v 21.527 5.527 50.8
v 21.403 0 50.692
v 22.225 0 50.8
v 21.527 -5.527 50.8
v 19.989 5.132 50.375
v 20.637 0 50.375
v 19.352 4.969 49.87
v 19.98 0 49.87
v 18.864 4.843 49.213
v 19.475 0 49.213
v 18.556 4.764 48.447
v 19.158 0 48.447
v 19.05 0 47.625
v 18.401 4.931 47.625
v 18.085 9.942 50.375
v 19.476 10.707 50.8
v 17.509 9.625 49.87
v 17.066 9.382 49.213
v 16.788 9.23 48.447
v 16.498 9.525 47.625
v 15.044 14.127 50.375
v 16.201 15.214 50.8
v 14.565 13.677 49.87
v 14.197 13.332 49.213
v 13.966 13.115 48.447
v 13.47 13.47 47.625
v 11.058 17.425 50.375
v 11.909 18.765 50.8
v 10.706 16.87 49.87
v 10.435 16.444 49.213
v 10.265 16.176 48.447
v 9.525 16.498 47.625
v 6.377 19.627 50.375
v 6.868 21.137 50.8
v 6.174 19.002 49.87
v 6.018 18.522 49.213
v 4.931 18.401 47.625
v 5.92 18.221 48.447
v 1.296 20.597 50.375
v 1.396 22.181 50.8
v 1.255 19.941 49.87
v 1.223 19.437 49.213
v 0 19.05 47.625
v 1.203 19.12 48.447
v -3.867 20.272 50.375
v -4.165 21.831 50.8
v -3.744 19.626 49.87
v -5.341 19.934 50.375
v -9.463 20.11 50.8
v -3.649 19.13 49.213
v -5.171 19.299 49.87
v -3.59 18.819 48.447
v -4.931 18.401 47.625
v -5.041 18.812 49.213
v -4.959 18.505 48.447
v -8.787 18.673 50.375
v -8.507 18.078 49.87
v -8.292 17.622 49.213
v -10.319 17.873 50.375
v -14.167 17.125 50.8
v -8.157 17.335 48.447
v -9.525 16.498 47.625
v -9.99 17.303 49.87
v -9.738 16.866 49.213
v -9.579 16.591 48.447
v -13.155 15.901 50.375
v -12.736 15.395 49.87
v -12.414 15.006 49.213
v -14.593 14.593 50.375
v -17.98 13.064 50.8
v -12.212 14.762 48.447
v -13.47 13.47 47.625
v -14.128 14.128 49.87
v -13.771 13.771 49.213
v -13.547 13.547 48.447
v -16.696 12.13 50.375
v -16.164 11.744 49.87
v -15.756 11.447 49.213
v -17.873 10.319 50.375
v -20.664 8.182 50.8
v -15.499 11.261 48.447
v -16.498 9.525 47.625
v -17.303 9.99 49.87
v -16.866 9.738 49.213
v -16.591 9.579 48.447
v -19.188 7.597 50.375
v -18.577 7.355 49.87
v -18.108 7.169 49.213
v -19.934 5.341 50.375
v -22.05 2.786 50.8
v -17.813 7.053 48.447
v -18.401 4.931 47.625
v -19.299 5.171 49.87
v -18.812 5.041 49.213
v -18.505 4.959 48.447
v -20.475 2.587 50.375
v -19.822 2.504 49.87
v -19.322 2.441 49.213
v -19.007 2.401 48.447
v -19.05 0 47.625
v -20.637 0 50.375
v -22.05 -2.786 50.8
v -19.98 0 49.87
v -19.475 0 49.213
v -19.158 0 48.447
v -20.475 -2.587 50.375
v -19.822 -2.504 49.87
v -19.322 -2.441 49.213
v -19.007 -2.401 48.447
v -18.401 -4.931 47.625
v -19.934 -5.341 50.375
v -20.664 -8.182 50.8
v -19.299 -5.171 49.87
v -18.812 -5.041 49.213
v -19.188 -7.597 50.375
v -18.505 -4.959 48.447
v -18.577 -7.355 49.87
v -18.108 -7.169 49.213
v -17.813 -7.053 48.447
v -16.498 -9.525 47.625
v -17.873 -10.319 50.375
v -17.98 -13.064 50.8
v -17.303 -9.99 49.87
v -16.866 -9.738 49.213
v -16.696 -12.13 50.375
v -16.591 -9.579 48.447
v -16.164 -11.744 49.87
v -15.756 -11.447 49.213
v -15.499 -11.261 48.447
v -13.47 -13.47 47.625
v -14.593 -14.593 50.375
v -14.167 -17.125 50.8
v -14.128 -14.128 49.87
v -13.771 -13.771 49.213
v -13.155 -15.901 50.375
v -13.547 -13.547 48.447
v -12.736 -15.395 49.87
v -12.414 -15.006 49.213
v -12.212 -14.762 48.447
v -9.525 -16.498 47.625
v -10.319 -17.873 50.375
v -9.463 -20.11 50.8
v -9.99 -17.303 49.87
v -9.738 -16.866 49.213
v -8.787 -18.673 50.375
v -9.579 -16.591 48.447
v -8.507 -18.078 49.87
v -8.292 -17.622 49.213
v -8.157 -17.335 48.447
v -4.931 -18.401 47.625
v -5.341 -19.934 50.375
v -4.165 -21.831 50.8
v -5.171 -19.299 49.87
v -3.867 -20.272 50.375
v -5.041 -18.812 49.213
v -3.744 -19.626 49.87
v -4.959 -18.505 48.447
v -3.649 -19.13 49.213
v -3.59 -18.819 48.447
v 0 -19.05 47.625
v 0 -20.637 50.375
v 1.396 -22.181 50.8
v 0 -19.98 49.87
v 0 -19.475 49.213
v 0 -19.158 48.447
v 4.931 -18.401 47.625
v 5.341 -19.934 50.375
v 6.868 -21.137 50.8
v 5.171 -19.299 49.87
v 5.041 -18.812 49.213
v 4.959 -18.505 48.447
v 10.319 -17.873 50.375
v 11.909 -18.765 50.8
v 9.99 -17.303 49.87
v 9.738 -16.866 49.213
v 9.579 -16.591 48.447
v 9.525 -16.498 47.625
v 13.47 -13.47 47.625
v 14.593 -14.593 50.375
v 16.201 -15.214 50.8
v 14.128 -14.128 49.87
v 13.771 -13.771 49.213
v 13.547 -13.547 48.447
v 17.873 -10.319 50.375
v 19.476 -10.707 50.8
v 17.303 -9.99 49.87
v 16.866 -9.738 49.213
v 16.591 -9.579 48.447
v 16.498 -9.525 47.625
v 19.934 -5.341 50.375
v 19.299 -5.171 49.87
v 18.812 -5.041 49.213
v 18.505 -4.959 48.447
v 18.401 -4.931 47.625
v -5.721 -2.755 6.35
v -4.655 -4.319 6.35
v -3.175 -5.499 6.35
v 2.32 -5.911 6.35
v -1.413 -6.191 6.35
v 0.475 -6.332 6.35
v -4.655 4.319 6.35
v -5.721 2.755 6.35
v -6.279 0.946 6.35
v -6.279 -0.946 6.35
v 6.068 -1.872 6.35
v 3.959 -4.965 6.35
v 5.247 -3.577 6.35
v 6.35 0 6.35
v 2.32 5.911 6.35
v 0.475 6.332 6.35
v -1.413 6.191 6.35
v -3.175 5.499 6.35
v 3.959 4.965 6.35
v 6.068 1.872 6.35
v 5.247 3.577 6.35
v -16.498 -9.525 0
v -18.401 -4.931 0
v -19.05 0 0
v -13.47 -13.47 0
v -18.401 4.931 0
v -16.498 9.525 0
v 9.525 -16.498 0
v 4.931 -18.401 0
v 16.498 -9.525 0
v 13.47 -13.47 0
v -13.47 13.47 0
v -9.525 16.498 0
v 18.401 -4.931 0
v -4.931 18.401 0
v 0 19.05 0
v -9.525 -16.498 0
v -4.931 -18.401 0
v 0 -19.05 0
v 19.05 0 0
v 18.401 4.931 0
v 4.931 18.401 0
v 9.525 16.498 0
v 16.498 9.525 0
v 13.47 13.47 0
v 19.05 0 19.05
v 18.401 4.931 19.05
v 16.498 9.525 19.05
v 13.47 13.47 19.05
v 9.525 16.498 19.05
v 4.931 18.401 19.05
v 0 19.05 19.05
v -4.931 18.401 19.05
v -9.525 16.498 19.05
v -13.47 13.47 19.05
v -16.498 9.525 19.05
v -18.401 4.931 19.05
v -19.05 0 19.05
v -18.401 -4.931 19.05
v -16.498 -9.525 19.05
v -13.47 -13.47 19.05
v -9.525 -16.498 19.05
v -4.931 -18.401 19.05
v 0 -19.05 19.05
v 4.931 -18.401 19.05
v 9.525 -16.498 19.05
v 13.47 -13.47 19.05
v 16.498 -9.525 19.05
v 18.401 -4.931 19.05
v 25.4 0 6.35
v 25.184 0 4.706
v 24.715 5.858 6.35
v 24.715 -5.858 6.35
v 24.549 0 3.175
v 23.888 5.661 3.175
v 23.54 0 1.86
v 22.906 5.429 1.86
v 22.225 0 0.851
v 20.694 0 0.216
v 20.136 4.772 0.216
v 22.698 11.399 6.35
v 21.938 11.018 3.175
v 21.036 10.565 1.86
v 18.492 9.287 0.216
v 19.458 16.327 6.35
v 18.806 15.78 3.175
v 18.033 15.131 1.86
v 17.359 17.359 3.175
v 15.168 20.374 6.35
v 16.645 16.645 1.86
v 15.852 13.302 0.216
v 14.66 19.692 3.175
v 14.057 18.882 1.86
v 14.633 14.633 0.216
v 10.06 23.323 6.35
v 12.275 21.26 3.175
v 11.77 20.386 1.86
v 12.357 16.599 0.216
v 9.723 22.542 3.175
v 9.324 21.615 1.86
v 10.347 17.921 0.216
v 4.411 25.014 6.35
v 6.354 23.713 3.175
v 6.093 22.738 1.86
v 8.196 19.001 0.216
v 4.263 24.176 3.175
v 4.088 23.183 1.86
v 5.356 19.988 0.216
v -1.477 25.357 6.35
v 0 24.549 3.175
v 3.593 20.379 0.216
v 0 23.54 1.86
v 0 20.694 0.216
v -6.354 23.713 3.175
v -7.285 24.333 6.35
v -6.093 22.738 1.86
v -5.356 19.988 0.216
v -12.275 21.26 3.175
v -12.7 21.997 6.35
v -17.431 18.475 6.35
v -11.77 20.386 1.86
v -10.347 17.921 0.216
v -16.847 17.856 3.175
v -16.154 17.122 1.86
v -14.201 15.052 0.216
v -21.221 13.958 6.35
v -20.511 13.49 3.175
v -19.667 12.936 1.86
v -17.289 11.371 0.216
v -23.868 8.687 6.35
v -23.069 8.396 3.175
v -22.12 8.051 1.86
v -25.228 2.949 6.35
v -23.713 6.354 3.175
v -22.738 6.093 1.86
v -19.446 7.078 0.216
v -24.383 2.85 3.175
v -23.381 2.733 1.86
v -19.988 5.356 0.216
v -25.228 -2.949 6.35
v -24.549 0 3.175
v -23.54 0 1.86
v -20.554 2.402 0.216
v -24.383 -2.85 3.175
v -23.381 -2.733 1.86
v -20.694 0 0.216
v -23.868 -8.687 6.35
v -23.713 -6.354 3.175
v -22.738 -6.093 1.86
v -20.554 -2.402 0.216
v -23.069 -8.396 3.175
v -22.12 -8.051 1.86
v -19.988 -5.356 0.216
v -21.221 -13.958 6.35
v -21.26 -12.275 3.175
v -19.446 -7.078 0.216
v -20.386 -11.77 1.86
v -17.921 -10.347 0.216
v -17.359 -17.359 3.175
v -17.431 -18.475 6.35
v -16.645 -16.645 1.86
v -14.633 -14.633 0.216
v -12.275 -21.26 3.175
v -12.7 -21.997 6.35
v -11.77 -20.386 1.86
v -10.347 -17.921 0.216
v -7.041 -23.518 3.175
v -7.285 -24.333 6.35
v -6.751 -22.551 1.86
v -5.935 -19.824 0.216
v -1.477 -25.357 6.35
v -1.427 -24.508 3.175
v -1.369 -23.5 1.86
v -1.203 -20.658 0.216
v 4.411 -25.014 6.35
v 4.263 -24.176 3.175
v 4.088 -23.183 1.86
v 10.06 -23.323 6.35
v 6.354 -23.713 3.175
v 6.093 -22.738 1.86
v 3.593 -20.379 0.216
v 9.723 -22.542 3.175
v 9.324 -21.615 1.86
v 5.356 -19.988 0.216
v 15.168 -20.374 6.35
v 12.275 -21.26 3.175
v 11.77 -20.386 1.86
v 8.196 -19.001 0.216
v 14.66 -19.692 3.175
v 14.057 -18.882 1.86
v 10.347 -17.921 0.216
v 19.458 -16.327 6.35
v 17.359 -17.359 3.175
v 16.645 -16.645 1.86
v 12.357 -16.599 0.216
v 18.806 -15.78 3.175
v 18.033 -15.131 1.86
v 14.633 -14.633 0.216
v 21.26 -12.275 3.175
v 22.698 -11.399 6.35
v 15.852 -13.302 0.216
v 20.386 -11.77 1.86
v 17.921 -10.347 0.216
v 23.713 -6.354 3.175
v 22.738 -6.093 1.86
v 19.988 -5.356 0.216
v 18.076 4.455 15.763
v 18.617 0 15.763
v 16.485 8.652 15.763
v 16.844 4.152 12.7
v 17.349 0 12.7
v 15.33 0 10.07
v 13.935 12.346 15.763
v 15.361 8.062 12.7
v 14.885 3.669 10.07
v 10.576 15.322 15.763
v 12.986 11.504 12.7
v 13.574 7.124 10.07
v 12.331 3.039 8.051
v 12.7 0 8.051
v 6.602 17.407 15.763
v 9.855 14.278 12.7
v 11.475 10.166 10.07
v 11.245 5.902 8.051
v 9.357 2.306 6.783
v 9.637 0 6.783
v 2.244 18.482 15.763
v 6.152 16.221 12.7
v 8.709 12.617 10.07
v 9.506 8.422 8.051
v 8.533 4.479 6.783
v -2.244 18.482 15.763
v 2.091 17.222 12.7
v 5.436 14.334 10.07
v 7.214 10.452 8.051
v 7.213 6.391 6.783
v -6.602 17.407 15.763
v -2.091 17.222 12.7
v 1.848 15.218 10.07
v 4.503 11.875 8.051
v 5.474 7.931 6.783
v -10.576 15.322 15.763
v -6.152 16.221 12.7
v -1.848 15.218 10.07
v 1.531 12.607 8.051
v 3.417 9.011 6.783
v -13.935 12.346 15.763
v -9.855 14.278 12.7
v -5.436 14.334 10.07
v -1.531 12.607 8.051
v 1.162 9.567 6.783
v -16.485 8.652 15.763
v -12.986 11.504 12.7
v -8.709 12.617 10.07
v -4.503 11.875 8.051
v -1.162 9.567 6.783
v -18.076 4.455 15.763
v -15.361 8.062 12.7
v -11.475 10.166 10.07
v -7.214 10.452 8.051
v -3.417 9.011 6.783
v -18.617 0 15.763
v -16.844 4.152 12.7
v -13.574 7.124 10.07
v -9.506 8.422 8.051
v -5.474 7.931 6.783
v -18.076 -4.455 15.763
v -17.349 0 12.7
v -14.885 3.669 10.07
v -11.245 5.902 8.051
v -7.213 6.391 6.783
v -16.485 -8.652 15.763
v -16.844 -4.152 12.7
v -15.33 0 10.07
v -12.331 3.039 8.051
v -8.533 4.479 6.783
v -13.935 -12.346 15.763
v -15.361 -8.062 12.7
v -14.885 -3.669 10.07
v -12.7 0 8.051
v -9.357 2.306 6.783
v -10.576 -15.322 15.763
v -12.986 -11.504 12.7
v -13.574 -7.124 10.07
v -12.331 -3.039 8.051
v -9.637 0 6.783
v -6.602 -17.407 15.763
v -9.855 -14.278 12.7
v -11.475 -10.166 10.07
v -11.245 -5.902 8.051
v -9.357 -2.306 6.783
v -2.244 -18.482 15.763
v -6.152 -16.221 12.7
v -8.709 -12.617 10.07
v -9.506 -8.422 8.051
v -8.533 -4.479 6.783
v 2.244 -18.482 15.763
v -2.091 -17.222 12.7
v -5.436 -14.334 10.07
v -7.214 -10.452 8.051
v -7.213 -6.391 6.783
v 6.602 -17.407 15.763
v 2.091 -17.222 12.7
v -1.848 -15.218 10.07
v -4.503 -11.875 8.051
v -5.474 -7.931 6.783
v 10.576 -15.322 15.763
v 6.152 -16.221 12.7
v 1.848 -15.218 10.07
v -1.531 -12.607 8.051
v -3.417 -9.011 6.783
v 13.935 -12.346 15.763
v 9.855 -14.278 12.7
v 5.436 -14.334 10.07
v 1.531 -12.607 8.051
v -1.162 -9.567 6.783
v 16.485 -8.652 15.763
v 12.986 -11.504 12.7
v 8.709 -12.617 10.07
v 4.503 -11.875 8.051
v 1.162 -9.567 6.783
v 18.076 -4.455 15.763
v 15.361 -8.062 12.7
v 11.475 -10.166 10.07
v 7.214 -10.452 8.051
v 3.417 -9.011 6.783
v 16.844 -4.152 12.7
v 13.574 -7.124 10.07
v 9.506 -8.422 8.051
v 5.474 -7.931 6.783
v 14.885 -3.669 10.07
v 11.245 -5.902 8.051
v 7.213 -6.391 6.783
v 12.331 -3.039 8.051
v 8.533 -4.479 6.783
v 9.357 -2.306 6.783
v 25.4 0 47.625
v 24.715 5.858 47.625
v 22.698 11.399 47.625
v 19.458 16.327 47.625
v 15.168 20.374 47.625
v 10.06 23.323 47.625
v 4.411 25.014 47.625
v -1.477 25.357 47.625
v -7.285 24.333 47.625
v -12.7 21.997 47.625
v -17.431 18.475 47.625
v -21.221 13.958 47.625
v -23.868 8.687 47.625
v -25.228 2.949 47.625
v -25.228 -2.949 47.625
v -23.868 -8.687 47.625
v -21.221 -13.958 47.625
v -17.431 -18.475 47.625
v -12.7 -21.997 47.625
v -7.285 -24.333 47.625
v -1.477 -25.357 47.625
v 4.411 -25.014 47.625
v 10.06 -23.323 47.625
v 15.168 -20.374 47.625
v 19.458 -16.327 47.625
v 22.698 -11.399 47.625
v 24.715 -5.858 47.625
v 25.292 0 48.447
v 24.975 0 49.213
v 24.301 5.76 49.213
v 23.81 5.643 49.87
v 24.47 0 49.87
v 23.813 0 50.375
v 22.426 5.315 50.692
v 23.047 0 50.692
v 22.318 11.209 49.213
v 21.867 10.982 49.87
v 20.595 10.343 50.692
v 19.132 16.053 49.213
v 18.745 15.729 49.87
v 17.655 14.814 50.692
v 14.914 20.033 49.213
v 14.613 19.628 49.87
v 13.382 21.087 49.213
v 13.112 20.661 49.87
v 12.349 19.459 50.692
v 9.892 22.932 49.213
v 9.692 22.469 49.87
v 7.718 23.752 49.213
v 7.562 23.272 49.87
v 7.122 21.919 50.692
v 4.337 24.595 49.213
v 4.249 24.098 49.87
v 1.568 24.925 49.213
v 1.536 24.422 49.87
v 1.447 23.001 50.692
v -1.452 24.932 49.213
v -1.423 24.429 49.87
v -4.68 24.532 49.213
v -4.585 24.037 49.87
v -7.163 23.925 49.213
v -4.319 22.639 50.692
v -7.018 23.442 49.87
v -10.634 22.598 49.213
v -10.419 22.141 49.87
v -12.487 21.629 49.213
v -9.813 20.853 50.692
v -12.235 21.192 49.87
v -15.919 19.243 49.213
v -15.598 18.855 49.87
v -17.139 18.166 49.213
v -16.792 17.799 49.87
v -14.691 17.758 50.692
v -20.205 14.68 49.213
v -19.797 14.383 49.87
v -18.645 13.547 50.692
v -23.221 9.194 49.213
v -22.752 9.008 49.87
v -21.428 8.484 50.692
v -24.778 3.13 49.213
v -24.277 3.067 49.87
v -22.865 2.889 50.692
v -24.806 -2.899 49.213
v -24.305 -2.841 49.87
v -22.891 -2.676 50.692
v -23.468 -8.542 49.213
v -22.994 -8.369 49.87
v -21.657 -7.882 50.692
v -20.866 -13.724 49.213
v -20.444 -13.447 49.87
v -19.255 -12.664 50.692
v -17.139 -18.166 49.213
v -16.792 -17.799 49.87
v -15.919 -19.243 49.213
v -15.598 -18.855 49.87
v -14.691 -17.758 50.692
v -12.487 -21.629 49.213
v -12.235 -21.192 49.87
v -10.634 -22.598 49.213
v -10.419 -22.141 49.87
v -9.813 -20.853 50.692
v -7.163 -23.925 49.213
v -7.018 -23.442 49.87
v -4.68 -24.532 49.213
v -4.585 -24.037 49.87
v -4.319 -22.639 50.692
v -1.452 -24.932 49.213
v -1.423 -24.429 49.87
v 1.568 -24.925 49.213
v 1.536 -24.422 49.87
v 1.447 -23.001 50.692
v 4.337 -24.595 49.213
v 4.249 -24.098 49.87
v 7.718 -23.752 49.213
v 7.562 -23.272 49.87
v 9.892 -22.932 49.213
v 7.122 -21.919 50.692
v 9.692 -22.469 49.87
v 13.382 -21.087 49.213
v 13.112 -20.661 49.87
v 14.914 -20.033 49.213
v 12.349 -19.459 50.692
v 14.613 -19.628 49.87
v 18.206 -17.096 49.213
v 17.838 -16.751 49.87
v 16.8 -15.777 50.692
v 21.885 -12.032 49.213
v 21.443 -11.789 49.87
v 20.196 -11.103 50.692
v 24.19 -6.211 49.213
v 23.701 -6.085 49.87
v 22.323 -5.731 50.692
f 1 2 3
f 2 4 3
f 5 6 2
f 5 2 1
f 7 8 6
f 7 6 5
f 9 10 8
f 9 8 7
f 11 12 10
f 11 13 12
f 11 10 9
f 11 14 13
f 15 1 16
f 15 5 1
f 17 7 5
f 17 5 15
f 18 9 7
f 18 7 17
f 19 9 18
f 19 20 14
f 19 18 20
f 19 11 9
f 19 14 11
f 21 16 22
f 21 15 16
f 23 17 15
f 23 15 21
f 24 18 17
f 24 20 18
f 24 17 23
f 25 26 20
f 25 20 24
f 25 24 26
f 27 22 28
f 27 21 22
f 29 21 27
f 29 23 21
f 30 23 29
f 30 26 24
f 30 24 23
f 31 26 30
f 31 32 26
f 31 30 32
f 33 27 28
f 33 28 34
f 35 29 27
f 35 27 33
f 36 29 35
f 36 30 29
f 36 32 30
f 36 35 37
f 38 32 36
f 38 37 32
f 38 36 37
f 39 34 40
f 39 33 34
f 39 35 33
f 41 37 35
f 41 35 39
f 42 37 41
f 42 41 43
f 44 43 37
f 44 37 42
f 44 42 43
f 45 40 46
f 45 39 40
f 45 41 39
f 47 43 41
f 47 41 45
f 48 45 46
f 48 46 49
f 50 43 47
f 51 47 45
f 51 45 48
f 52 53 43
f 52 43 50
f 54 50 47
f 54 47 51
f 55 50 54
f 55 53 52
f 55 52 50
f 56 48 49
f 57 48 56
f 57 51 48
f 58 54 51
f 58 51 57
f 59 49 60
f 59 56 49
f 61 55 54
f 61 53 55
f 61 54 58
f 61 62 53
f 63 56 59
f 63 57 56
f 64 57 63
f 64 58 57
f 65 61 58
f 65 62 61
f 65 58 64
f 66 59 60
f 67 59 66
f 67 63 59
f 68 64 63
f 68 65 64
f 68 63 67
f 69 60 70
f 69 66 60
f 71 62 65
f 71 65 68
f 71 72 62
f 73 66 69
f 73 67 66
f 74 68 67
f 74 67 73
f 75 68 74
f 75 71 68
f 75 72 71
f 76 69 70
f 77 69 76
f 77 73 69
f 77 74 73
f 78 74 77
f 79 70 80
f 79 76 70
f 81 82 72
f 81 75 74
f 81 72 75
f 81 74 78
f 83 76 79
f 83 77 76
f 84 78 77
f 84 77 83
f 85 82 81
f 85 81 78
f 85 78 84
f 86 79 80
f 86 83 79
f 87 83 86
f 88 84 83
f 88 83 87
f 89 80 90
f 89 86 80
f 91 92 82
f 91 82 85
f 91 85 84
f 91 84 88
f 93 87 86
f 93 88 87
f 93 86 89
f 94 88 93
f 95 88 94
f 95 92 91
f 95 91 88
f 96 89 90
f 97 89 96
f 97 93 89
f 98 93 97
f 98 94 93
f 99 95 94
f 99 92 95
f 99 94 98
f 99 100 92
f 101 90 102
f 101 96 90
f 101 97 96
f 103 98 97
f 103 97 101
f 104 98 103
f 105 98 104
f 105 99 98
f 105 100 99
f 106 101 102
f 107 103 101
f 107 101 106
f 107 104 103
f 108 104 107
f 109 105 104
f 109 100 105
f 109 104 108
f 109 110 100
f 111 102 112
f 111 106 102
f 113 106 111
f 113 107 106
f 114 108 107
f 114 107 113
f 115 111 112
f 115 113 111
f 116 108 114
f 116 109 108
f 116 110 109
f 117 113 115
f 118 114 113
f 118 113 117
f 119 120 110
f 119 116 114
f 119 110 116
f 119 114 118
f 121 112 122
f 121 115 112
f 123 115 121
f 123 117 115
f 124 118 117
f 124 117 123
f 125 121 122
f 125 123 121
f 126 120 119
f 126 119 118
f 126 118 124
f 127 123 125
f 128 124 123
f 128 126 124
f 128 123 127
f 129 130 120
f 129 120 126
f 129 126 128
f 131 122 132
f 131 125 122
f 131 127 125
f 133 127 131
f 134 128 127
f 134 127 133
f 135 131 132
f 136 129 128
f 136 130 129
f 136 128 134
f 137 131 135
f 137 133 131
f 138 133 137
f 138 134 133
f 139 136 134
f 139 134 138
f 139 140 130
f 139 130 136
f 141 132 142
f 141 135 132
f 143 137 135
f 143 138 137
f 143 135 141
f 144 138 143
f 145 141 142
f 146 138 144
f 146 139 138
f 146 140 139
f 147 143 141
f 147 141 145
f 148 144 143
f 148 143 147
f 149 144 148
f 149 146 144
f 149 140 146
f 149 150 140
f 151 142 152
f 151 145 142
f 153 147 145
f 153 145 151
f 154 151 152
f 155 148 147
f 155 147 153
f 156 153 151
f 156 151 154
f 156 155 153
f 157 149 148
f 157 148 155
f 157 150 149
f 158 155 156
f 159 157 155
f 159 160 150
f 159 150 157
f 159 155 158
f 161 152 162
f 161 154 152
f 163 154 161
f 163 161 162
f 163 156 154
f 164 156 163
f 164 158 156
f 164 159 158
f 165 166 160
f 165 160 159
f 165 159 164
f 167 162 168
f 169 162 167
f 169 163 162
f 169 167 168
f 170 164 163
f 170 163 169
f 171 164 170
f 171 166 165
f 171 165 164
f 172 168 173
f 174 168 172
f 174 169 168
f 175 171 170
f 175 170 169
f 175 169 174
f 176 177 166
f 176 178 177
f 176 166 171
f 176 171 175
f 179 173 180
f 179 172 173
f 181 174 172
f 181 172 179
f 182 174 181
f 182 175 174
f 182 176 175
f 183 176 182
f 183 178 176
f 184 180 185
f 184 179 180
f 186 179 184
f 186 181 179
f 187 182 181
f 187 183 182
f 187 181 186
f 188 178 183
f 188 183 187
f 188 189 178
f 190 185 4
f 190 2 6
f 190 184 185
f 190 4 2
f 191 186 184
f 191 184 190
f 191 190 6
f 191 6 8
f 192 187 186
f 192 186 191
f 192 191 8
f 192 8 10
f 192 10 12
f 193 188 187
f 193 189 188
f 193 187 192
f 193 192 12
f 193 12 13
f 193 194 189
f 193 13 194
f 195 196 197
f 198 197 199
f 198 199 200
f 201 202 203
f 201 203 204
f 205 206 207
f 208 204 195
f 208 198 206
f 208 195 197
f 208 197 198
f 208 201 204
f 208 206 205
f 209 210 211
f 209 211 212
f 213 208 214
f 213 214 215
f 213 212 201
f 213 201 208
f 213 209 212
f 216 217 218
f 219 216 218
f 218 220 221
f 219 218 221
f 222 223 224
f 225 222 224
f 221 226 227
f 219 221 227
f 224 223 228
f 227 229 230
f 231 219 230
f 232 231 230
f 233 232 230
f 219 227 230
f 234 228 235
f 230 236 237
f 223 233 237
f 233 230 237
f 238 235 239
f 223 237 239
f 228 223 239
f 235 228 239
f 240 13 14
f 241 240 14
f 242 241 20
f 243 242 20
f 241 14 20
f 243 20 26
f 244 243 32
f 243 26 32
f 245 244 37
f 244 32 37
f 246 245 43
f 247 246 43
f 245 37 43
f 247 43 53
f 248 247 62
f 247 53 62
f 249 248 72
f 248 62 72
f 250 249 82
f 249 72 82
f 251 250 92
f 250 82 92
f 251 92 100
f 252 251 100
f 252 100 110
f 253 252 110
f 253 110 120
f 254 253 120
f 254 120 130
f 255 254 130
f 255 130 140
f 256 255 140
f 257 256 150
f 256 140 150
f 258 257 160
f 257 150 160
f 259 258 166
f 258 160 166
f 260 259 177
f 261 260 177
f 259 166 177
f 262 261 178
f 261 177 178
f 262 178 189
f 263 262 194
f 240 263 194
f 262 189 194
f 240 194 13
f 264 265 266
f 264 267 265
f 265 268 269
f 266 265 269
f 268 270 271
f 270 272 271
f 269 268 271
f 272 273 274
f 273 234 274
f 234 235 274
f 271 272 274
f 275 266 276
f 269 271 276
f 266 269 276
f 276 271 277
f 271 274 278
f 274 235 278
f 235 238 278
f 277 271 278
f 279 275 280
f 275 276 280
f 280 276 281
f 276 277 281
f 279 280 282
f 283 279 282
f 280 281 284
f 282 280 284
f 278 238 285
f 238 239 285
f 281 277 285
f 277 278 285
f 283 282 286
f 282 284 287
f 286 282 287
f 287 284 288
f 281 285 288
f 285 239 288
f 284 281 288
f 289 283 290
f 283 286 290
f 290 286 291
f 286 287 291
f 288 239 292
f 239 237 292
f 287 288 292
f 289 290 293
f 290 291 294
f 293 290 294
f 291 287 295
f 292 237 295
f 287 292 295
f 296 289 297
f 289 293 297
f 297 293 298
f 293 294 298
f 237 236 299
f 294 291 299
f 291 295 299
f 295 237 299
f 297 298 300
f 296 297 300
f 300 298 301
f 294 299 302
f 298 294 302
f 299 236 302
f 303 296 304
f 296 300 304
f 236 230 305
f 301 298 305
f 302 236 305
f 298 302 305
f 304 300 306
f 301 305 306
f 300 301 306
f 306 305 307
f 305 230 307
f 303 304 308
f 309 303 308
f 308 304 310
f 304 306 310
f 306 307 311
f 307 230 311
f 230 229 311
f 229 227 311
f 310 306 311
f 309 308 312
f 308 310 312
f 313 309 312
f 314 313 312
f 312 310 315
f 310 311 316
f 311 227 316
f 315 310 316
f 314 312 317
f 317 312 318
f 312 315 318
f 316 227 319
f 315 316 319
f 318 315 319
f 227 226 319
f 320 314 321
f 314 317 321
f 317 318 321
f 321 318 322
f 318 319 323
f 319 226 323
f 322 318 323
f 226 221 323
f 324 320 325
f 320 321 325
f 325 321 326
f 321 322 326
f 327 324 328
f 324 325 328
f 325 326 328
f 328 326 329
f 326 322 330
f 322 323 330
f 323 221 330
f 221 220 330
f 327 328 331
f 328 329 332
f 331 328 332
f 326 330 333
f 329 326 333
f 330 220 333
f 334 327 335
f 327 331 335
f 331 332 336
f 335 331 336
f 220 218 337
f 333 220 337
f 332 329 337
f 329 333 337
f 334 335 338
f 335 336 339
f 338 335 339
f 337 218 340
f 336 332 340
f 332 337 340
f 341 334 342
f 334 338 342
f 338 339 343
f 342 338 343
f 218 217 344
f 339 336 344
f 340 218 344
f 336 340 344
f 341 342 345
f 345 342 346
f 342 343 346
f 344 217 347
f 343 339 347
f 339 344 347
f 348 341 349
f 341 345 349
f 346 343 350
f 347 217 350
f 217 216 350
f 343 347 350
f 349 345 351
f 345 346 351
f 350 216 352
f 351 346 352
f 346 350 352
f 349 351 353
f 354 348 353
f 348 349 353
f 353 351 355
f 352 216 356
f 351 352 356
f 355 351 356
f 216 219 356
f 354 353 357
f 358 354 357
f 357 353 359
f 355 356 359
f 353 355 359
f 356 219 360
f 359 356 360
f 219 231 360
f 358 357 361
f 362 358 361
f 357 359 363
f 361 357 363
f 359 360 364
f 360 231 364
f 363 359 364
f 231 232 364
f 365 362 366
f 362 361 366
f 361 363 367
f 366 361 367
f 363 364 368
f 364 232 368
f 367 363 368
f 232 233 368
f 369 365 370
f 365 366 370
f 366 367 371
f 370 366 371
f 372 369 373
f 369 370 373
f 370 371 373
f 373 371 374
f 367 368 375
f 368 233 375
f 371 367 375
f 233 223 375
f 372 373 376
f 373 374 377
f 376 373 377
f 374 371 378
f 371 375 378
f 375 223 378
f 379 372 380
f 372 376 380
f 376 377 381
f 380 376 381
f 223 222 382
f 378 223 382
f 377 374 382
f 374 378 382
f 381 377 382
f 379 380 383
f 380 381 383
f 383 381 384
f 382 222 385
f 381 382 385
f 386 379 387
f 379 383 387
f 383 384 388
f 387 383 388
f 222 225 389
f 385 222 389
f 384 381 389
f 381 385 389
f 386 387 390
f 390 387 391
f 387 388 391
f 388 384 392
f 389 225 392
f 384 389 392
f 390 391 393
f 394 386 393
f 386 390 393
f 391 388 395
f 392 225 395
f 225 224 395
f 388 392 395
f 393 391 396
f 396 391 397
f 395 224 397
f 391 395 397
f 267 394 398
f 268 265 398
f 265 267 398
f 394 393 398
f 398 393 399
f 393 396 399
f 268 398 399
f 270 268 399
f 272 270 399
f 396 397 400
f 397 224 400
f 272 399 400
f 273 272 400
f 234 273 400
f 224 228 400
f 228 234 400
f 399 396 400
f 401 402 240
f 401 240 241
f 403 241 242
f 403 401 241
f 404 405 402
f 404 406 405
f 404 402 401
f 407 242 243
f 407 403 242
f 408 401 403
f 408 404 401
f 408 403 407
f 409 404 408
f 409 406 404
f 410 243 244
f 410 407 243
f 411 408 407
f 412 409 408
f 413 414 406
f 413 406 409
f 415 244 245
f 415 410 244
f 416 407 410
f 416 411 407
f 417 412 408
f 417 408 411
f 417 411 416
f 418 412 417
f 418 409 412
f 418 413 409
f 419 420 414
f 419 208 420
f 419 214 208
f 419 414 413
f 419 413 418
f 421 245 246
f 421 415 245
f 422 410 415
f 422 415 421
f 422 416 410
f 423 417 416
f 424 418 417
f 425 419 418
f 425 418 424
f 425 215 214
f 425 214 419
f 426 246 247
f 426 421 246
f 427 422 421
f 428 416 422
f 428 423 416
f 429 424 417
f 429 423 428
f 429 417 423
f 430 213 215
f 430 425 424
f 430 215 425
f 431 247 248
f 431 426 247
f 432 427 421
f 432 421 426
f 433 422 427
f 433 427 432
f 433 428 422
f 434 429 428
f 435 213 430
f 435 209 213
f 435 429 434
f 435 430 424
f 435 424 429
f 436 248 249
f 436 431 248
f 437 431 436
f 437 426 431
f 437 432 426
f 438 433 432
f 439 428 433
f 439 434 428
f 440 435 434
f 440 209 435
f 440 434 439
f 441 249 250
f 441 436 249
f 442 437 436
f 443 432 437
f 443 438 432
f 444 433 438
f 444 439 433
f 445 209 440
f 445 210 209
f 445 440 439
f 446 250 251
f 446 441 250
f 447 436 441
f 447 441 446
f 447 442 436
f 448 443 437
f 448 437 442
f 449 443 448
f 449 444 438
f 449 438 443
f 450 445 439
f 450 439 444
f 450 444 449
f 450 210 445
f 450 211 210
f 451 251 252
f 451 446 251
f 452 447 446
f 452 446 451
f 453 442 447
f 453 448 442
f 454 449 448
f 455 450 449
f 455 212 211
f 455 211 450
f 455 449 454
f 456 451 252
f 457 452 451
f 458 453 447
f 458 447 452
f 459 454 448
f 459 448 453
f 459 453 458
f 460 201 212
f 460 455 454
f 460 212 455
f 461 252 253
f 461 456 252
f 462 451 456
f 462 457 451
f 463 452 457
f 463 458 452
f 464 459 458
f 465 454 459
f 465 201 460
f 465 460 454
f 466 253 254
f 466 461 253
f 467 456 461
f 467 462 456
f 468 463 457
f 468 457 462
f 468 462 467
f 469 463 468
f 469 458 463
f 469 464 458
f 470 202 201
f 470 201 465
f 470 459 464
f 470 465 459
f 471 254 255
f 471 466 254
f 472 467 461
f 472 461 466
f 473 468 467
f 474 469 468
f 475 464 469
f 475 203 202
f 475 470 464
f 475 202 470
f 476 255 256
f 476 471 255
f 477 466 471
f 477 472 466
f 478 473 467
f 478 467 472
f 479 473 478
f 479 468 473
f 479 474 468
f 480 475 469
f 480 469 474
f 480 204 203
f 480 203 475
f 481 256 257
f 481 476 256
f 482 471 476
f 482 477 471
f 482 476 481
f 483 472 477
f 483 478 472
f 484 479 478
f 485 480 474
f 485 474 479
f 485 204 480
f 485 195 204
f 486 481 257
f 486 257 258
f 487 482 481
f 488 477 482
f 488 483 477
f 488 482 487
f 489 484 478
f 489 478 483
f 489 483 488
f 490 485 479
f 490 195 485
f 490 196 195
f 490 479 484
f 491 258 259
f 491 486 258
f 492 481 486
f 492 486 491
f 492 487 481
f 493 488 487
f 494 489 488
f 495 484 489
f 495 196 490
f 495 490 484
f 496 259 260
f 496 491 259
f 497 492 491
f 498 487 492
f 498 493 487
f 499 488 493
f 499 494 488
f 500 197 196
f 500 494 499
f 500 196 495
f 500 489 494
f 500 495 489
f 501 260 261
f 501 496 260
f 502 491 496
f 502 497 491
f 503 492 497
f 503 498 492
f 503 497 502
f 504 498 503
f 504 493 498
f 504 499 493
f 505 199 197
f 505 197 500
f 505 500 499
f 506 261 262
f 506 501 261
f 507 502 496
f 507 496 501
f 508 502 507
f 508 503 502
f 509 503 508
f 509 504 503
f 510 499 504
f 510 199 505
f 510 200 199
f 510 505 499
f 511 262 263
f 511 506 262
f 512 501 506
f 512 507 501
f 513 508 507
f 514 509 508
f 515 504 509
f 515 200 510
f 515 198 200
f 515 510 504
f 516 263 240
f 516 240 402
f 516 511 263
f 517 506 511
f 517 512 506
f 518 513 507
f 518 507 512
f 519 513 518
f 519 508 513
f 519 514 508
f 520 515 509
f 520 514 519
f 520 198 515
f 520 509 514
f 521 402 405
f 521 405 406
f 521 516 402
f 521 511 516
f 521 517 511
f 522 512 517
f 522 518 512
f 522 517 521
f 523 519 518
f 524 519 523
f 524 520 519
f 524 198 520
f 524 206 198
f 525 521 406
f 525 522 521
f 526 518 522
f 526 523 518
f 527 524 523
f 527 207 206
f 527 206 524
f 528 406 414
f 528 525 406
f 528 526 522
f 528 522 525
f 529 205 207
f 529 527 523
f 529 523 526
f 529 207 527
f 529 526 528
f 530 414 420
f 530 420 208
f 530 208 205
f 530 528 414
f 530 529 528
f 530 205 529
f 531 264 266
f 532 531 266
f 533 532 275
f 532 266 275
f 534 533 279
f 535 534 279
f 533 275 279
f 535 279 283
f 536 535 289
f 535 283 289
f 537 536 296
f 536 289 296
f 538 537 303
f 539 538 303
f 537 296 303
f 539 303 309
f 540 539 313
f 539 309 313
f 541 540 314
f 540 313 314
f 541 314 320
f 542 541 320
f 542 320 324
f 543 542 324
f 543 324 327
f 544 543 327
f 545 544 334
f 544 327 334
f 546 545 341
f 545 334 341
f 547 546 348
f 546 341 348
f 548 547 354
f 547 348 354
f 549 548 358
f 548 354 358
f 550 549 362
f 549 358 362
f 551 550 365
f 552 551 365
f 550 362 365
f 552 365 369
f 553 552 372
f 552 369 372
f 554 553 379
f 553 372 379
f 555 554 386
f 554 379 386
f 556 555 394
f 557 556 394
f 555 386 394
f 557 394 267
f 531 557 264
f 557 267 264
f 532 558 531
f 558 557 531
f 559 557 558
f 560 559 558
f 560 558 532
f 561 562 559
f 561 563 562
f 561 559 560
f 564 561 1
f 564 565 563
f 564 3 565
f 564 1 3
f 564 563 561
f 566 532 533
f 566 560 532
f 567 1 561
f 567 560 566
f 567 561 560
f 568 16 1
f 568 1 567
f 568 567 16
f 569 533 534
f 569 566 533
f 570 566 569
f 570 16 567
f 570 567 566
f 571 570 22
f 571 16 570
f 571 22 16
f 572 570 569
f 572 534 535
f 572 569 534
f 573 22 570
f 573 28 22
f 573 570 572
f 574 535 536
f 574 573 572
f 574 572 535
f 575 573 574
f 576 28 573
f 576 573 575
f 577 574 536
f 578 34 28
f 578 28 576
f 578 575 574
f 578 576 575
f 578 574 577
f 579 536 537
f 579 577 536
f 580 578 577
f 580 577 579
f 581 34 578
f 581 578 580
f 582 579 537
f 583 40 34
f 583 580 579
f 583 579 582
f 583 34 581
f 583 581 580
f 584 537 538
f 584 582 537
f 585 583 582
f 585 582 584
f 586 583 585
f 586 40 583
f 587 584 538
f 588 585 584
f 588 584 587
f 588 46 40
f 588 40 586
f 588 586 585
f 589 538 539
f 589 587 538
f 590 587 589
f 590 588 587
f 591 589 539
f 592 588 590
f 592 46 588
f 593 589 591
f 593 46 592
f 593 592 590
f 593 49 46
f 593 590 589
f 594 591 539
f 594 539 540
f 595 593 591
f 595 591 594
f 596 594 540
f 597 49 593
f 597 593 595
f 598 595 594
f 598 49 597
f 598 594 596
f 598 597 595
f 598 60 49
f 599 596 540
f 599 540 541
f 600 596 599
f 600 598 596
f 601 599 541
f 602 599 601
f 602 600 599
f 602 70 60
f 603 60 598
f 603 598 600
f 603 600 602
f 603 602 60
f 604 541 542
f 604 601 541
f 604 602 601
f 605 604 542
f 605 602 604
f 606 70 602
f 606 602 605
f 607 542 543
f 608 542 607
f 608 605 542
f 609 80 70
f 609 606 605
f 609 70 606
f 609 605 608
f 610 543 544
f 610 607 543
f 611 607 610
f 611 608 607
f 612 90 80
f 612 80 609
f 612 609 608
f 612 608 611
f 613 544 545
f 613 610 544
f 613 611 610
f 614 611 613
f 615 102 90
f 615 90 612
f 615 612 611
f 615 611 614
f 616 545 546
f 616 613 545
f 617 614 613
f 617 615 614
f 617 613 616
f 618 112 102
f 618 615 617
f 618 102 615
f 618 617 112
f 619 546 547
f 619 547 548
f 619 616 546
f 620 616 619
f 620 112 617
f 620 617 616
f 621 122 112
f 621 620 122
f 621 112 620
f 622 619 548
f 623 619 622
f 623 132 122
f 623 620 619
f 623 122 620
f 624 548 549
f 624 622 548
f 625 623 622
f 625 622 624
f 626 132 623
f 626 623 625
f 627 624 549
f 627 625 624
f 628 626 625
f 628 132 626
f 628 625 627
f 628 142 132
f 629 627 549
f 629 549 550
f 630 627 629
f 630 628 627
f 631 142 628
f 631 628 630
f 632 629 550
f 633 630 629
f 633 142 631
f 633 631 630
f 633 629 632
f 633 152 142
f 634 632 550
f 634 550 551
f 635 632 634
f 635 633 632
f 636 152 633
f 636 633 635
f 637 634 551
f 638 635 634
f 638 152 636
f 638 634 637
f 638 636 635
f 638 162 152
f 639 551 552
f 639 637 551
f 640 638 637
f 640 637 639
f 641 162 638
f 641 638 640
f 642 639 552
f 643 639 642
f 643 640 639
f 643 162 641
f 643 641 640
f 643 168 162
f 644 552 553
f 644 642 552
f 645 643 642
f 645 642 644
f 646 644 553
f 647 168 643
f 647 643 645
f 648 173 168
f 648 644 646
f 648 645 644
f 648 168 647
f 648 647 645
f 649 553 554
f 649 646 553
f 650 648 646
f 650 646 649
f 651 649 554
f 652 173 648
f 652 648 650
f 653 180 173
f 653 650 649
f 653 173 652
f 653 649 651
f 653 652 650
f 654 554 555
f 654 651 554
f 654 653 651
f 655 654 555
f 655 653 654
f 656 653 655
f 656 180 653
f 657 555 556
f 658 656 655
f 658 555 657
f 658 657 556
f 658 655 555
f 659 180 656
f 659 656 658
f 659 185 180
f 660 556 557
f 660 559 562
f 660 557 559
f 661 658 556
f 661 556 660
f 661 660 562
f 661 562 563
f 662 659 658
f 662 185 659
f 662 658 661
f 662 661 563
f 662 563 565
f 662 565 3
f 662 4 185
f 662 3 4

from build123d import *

# Parameters (mm, degrees)
F0_R     = 25.4
F1_DEPTH = 50.8
F2_R     = 19.05
F3_DEPTH = 44.45
F4_R     = 3.17499
F5_R     = 12.7
F6_R     = 6.35


# Not quite as in the source:
# - a fillet or chamfer is up to 0.001 mm smaller than in the source, because OpenCascade refuses the exact size


with BuildPart() as f1:
    # F0 (on Top) → F1 (new body)
    with BuildSketch(Plane.XY):
        Circle(F0_R)
    extrude(amount=F1_DEPTH)

    # F2 (on face) → F3 (cut)
    with BuildSketch(Plane.XY.offset(50.8)):
        Circle(F2_R)
    extrude(amount=-F3_DEPTH, mode=Mode.SUBTRACT)

    # F4 (radius 3.175 in the source; OpenCascade refuses exactly that, so slightly less here)
    f4_edges = [f1.edges().sort_by_distance(p)[0] for p in [
        (-25.4, 0, 50.8),
        (-19.05, 0, 50.8),
    ]]
    fillet(f4_edges, radius=F4_R)

    # F5
    f5_edges = [f1.edges().sort_by_distance(p)[0] for p in [
        (-19.05, 0, 6.35),
    ]]
    fillet(f5_edges, radius=F5_R)

    # F6
    f6_edges = [f1.edges().sort_by_distance(p)[0] for p in [
        (-25.4, 0, 0),
    ]]
    fillet(f6_edges, radius=F6_R)


solid = f1.part
